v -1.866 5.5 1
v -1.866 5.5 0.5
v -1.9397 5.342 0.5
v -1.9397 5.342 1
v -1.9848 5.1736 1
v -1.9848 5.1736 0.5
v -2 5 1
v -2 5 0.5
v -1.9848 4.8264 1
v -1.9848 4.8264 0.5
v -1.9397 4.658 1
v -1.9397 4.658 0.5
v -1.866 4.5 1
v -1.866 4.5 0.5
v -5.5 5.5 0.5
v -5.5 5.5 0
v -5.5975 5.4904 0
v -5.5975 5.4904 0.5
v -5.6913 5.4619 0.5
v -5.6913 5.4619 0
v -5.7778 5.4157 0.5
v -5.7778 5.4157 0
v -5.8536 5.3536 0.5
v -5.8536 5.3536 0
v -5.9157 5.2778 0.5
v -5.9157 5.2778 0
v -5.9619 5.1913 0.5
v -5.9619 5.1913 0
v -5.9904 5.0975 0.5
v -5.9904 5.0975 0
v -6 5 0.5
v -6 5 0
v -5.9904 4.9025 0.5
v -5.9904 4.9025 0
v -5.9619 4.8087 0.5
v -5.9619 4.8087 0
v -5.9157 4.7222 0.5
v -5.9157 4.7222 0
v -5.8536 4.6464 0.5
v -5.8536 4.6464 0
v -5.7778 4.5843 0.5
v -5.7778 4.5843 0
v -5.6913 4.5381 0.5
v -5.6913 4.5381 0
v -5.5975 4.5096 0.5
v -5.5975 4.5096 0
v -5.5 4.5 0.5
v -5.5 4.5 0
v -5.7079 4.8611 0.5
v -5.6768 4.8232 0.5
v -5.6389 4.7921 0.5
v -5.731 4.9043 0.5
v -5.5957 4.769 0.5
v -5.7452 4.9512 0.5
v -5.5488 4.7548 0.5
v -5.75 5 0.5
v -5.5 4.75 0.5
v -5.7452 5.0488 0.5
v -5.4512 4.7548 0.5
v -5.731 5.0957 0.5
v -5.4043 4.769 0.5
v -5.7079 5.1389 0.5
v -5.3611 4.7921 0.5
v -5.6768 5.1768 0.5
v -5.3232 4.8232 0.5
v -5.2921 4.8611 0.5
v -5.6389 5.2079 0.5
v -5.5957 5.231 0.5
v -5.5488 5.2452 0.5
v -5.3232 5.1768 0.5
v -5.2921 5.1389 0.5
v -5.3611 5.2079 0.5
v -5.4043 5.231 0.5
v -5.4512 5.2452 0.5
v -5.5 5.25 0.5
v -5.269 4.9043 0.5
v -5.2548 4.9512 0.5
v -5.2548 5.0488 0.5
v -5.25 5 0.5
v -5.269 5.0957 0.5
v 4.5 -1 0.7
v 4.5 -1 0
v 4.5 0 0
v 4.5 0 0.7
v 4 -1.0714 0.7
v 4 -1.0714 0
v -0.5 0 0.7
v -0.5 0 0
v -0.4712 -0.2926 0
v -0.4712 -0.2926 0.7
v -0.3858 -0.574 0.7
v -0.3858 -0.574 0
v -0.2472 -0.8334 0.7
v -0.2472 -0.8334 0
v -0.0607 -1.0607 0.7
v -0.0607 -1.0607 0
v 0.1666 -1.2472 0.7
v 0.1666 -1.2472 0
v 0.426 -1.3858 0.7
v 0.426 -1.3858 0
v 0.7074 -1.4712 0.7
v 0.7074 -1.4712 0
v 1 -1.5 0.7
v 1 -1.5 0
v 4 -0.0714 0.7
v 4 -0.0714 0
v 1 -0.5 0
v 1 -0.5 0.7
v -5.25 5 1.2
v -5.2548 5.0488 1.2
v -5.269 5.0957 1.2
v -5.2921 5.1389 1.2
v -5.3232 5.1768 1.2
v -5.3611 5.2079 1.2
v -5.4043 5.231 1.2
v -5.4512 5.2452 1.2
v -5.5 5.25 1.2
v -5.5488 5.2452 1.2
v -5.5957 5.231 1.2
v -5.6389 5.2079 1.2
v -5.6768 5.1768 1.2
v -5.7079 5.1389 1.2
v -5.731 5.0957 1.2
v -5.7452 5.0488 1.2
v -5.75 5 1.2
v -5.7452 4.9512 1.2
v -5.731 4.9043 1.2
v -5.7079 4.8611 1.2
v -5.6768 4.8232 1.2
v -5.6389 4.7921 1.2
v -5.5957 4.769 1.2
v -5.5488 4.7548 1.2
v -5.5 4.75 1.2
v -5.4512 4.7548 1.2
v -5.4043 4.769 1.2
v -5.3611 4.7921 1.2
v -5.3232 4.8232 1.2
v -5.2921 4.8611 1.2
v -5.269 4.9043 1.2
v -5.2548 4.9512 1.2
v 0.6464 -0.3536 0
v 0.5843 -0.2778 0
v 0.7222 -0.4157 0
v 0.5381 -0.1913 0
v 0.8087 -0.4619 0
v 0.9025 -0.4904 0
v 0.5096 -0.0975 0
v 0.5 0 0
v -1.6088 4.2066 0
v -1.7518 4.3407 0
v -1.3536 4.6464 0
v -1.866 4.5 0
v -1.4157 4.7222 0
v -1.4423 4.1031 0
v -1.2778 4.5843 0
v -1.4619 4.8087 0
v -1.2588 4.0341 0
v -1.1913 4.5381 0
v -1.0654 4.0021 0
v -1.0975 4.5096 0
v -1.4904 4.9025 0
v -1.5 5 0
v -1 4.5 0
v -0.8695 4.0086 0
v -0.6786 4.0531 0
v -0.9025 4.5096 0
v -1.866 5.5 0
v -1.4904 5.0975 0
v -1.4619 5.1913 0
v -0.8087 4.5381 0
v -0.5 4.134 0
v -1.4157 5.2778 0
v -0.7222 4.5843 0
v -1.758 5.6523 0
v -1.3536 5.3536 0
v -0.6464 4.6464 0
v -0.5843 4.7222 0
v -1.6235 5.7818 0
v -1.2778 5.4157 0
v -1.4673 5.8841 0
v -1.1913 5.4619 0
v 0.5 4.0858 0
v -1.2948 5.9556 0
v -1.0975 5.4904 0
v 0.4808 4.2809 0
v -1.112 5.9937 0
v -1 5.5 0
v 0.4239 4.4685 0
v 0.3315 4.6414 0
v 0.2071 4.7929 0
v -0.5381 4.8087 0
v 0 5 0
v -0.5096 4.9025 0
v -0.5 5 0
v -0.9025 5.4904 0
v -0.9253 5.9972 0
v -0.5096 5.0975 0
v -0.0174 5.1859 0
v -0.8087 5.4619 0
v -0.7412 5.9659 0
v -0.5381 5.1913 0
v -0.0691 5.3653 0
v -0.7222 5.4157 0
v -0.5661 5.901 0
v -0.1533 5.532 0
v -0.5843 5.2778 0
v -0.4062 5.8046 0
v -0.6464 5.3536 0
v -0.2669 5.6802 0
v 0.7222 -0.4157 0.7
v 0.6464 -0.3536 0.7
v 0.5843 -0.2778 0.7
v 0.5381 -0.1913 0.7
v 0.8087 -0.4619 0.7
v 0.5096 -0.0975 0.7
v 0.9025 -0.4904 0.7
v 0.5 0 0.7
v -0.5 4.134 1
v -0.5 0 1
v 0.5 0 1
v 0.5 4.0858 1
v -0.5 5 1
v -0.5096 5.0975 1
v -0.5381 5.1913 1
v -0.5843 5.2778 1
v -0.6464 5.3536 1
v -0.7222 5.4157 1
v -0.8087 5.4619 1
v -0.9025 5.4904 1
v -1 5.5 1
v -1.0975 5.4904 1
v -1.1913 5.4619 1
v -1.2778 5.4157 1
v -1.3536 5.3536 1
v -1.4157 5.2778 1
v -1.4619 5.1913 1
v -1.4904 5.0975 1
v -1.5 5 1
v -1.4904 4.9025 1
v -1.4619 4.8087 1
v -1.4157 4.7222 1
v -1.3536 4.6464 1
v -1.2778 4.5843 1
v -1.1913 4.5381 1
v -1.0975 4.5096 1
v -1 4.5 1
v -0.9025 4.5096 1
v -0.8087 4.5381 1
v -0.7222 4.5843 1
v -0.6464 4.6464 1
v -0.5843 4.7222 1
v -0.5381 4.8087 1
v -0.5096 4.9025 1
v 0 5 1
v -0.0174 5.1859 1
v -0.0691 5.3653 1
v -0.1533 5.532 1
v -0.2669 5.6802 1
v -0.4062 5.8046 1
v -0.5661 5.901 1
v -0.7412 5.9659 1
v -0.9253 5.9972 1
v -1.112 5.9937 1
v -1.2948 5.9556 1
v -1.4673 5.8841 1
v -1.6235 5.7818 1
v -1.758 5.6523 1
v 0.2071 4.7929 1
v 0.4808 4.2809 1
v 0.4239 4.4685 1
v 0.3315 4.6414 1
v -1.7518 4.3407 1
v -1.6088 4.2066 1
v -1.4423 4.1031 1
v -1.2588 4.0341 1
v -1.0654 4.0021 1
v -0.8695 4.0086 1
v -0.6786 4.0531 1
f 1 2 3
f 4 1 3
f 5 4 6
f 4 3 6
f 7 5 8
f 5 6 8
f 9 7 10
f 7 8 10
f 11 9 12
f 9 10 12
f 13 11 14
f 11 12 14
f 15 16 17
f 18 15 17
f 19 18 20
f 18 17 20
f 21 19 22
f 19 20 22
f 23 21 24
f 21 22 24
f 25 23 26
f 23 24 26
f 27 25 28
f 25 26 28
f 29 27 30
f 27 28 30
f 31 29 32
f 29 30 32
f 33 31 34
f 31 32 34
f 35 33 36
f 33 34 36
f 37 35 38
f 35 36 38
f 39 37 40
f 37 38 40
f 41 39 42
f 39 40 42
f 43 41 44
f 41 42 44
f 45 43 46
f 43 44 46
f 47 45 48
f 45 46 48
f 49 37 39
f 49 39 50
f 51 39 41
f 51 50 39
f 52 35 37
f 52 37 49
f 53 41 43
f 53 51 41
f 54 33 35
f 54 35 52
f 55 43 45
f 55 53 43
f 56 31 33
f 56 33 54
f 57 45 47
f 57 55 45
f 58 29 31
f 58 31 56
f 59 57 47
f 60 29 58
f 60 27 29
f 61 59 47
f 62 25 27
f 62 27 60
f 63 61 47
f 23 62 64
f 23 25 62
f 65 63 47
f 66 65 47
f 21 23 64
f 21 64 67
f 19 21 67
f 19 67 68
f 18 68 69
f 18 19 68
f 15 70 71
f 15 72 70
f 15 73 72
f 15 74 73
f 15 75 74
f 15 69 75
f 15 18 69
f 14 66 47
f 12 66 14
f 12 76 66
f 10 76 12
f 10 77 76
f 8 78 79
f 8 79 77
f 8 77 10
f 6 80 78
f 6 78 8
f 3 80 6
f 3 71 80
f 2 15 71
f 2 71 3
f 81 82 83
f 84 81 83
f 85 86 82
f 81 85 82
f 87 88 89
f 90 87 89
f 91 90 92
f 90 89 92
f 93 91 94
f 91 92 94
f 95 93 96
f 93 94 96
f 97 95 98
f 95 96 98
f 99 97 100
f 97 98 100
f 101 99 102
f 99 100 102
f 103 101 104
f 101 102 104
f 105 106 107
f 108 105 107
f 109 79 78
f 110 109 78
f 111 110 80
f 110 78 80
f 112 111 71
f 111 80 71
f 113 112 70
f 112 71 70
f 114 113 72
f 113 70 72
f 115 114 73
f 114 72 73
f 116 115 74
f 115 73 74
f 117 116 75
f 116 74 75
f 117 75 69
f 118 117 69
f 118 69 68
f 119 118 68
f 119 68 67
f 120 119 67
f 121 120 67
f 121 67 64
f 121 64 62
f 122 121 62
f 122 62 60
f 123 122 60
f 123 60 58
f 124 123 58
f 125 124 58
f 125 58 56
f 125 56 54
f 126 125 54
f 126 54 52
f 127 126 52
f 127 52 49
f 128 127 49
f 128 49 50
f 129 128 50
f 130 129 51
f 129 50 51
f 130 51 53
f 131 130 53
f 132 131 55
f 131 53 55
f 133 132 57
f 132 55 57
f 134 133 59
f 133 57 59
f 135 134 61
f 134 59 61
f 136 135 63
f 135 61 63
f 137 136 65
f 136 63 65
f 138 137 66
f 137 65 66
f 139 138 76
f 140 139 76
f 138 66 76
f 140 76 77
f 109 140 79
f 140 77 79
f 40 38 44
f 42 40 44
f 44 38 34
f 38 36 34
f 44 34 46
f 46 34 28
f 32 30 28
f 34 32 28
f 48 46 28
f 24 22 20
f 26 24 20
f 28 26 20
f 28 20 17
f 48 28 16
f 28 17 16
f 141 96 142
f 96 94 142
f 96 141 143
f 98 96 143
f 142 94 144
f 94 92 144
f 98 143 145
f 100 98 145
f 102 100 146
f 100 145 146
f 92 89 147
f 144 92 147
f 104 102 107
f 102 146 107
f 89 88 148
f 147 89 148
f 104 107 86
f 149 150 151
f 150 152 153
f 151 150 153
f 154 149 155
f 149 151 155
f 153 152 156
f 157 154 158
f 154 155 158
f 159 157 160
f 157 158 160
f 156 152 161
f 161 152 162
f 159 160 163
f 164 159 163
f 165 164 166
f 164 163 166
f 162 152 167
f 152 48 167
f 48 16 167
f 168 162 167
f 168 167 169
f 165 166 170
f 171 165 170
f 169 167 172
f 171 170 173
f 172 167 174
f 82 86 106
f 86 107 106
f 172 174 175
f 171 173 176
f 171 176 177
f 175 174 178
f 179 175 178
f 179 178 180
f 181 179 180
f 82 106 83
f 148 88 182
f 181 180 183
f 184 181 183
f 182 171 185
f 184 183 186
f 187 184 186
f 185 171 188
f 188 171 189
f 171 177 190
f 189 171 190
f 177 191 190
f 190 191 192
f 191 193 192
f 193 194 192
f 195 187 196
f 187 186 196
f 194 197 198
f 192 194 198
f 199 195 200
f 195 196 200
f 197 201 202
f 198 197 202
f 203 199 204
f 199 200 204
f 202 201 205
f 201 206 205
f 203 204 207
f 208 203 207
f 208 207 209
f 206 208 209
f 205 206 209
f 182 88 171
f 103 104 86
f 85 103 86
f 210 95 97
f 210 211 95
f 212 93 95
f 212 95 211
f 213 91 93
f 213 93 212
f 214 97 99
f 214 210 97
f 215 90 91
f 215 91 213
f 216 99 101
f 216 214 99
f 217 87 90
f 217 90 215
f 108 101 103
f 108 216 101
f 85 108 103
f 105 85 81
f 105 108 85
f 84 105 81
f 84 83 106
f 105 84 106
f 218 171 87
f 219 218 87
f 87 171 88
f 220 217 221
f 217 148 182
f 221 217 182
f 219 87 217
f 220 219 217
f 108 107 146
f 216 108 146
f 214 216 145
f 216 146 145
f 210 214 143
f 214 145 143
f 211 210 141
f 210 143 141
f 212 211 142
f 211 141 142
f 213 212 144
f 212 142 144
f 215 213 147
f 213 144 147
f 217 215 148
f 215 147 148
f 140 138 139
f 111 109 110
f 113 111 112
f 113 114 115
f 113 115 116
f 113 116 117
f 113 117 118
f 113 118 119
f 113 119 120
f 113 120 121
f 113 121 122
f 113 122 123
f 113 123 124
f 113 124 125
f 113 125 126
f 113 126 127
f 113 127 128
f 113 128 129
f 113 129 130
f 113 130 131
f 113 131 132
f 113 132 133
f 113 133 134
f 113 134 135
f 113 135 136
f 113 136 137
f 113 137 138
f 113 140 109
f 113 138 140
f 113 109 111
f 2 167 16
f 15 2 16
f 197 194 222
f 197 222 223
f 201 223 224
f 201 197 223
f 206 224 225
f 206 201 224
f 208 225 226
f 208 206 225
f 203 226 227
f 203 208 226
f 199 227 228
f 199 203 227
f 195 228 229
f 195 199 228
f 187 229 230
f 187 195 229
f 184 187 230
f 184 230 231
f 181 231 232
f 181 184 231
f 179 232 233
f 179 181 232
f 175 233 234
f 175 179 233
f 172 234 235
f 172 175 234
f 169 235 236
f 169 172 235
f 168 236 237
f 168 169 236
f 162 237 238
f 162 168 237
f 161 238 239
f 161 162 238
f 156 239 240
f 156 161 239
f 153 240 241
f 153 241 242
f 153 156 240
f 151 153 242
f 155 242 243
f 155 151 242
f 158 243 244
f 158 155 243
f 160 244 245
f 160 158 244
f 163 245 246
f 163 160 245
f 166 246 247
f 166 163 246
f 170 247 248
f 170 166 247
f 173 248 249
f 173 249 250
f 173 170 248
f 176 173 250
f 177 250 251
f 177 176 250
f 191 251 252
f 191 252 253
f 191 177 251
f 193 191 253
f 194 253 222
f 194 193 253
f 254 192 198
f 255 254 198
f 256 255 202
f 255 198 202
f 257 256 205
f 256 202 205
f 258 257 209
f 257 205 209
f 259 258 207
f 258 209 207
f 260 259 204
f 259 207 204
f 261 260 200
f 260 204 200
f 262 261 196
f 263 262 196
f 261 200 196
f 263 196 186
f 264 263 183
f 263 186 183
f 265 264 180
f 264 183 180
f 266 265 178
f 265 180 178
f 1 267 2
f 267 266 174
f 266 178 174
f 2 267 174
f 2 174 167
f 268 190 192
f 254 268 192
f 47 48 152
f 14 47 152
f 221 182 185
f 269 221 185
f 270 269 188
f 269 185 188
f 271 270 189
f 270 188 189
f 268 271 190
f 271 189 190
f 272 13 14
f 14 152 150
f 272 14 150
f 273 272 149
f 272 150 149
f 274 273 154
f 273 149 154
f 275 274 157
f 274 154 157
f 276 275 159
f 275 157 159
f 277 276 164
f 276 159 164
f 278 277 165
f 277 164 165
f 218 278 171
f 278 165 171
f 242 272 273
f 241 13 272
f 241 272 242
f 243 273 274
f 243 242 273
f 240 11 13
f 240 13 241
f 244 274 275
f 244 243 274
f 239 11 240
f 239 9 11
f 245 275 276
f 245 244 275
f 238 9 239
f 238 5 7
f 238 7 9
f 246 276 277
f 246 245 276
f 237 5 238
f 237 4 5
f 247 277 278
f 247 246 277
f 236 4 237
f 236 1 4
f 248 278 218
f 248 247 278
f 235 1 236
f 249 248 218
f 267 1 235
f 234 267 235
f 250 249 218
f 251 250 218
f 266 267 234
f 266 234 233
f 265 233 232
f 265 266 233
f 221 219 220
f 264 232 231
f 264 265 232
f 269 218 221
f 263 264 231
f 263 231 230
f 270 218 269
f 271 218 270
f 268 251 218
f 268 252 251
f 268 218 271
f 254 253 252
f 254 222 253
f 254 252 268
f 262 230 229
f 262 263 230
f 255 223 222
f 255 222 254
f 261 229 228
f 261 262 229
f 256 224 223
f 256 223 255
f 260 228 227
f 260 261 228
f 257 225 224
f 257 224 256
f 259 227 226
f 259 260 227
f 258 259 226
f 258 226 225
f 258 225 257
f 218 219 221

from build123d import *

# Parameters (mm, degrees)
F0_R     = 0.25
F1_DEPTH = 0.5
F0_R_2   = 0.5
F2_DEPTH = 1
F3_DEPTH = 0.7
F4_DEPTH = 0.7
F5_DEPTH = 1.2


with BuildPart() as f1:
    # F0 (on Top) → F1 (new body)
    with BuildSketch(Plane.XY):
        with BuildLine():
            Line((-5.5, 4.5), (-1.866025, 4.5))
            ThreePointArc((-1.866025, 4.5), (-2, 5), (-1.866025, 5.5))
            Line((-1.866025, 5.5), (-5.5, 5.5))
            ThreePointArc((-5.5, 5.5), (-6, 5), (-5.5, 4.5))
        make_face()
        with Locations((-5.5, 5)):
            Circle(F0_R, mode=Mode.SUBTRACT)
    extrude(amount=F1_DEPTH)

    # F0 (on Top) → F2 (join)
    with BuildSketch(Plane.XY):
        with BuildLine():
            ThreePointArc((-1.866025, 4.5), (-1.258819, 4.034074), (-0.5, 4.133975))
            Line((-0.5, 4.133975), (-0.5, 0))
            Line((-0.5, 0), (0.5, 0))
            Line((0.5, 0), (0.5, 4.085786))
            ThreePointArc((0.5, 4.085786), (0.42388, 4.46847), (0.207107, 4.792893))
            Line((0.207107, 4.792893), (0, 5))
            ThreePointArc((0, 5), (-0.741181, 5.965926), (-1.866025, 5.5))
            ThreePointArc((-1.866025, 5.5), (-2, 5), (-1.866025, 4.5))
        make_face()
        with Locations((-1, 5)):
            Circle(F0_R_2, mode=Mode.SUBTRACT)
    extrude(amount=F2_DEPTH)

    # F0 (on Top) → F3 (join)
    with BuildSketch(Plane.XY):
        with BuildLine():
            Line((0.5, 0), (-0.5, 0))
            ThreePointArc((-0.5, 0), (-0.06066, -1.06066), (1, -1.5))
            Line((1, -1.5), (4, -1.071429))
            Line((4, -1.071429), (4, -0.071429))
            Line((4, -0.071429), (1, -0.5))
            ThreePointArc((1, -0.5), (0.646447, -0.353553), (0.5, 0))
        make_face()
    extrude(amount=F3_DEPTH)

    # F0 (on Top) → F4 (join, through all)
    with BuildSketch(Plane.XY):
        Polygon((4, -0.071429), (4, -1.071429), (4.5, -1), (4.5, 0), align=None)
    extrude(amount=F4_DEPTH)

    # F0 (on Top) → F5 (join)
    with BuildSketch(Plane.XY):
        with Locations((-5.5, 5)):
            Circle(F0_R)
    extrude(amount=F5_DEPTH)


solid = f1.part
